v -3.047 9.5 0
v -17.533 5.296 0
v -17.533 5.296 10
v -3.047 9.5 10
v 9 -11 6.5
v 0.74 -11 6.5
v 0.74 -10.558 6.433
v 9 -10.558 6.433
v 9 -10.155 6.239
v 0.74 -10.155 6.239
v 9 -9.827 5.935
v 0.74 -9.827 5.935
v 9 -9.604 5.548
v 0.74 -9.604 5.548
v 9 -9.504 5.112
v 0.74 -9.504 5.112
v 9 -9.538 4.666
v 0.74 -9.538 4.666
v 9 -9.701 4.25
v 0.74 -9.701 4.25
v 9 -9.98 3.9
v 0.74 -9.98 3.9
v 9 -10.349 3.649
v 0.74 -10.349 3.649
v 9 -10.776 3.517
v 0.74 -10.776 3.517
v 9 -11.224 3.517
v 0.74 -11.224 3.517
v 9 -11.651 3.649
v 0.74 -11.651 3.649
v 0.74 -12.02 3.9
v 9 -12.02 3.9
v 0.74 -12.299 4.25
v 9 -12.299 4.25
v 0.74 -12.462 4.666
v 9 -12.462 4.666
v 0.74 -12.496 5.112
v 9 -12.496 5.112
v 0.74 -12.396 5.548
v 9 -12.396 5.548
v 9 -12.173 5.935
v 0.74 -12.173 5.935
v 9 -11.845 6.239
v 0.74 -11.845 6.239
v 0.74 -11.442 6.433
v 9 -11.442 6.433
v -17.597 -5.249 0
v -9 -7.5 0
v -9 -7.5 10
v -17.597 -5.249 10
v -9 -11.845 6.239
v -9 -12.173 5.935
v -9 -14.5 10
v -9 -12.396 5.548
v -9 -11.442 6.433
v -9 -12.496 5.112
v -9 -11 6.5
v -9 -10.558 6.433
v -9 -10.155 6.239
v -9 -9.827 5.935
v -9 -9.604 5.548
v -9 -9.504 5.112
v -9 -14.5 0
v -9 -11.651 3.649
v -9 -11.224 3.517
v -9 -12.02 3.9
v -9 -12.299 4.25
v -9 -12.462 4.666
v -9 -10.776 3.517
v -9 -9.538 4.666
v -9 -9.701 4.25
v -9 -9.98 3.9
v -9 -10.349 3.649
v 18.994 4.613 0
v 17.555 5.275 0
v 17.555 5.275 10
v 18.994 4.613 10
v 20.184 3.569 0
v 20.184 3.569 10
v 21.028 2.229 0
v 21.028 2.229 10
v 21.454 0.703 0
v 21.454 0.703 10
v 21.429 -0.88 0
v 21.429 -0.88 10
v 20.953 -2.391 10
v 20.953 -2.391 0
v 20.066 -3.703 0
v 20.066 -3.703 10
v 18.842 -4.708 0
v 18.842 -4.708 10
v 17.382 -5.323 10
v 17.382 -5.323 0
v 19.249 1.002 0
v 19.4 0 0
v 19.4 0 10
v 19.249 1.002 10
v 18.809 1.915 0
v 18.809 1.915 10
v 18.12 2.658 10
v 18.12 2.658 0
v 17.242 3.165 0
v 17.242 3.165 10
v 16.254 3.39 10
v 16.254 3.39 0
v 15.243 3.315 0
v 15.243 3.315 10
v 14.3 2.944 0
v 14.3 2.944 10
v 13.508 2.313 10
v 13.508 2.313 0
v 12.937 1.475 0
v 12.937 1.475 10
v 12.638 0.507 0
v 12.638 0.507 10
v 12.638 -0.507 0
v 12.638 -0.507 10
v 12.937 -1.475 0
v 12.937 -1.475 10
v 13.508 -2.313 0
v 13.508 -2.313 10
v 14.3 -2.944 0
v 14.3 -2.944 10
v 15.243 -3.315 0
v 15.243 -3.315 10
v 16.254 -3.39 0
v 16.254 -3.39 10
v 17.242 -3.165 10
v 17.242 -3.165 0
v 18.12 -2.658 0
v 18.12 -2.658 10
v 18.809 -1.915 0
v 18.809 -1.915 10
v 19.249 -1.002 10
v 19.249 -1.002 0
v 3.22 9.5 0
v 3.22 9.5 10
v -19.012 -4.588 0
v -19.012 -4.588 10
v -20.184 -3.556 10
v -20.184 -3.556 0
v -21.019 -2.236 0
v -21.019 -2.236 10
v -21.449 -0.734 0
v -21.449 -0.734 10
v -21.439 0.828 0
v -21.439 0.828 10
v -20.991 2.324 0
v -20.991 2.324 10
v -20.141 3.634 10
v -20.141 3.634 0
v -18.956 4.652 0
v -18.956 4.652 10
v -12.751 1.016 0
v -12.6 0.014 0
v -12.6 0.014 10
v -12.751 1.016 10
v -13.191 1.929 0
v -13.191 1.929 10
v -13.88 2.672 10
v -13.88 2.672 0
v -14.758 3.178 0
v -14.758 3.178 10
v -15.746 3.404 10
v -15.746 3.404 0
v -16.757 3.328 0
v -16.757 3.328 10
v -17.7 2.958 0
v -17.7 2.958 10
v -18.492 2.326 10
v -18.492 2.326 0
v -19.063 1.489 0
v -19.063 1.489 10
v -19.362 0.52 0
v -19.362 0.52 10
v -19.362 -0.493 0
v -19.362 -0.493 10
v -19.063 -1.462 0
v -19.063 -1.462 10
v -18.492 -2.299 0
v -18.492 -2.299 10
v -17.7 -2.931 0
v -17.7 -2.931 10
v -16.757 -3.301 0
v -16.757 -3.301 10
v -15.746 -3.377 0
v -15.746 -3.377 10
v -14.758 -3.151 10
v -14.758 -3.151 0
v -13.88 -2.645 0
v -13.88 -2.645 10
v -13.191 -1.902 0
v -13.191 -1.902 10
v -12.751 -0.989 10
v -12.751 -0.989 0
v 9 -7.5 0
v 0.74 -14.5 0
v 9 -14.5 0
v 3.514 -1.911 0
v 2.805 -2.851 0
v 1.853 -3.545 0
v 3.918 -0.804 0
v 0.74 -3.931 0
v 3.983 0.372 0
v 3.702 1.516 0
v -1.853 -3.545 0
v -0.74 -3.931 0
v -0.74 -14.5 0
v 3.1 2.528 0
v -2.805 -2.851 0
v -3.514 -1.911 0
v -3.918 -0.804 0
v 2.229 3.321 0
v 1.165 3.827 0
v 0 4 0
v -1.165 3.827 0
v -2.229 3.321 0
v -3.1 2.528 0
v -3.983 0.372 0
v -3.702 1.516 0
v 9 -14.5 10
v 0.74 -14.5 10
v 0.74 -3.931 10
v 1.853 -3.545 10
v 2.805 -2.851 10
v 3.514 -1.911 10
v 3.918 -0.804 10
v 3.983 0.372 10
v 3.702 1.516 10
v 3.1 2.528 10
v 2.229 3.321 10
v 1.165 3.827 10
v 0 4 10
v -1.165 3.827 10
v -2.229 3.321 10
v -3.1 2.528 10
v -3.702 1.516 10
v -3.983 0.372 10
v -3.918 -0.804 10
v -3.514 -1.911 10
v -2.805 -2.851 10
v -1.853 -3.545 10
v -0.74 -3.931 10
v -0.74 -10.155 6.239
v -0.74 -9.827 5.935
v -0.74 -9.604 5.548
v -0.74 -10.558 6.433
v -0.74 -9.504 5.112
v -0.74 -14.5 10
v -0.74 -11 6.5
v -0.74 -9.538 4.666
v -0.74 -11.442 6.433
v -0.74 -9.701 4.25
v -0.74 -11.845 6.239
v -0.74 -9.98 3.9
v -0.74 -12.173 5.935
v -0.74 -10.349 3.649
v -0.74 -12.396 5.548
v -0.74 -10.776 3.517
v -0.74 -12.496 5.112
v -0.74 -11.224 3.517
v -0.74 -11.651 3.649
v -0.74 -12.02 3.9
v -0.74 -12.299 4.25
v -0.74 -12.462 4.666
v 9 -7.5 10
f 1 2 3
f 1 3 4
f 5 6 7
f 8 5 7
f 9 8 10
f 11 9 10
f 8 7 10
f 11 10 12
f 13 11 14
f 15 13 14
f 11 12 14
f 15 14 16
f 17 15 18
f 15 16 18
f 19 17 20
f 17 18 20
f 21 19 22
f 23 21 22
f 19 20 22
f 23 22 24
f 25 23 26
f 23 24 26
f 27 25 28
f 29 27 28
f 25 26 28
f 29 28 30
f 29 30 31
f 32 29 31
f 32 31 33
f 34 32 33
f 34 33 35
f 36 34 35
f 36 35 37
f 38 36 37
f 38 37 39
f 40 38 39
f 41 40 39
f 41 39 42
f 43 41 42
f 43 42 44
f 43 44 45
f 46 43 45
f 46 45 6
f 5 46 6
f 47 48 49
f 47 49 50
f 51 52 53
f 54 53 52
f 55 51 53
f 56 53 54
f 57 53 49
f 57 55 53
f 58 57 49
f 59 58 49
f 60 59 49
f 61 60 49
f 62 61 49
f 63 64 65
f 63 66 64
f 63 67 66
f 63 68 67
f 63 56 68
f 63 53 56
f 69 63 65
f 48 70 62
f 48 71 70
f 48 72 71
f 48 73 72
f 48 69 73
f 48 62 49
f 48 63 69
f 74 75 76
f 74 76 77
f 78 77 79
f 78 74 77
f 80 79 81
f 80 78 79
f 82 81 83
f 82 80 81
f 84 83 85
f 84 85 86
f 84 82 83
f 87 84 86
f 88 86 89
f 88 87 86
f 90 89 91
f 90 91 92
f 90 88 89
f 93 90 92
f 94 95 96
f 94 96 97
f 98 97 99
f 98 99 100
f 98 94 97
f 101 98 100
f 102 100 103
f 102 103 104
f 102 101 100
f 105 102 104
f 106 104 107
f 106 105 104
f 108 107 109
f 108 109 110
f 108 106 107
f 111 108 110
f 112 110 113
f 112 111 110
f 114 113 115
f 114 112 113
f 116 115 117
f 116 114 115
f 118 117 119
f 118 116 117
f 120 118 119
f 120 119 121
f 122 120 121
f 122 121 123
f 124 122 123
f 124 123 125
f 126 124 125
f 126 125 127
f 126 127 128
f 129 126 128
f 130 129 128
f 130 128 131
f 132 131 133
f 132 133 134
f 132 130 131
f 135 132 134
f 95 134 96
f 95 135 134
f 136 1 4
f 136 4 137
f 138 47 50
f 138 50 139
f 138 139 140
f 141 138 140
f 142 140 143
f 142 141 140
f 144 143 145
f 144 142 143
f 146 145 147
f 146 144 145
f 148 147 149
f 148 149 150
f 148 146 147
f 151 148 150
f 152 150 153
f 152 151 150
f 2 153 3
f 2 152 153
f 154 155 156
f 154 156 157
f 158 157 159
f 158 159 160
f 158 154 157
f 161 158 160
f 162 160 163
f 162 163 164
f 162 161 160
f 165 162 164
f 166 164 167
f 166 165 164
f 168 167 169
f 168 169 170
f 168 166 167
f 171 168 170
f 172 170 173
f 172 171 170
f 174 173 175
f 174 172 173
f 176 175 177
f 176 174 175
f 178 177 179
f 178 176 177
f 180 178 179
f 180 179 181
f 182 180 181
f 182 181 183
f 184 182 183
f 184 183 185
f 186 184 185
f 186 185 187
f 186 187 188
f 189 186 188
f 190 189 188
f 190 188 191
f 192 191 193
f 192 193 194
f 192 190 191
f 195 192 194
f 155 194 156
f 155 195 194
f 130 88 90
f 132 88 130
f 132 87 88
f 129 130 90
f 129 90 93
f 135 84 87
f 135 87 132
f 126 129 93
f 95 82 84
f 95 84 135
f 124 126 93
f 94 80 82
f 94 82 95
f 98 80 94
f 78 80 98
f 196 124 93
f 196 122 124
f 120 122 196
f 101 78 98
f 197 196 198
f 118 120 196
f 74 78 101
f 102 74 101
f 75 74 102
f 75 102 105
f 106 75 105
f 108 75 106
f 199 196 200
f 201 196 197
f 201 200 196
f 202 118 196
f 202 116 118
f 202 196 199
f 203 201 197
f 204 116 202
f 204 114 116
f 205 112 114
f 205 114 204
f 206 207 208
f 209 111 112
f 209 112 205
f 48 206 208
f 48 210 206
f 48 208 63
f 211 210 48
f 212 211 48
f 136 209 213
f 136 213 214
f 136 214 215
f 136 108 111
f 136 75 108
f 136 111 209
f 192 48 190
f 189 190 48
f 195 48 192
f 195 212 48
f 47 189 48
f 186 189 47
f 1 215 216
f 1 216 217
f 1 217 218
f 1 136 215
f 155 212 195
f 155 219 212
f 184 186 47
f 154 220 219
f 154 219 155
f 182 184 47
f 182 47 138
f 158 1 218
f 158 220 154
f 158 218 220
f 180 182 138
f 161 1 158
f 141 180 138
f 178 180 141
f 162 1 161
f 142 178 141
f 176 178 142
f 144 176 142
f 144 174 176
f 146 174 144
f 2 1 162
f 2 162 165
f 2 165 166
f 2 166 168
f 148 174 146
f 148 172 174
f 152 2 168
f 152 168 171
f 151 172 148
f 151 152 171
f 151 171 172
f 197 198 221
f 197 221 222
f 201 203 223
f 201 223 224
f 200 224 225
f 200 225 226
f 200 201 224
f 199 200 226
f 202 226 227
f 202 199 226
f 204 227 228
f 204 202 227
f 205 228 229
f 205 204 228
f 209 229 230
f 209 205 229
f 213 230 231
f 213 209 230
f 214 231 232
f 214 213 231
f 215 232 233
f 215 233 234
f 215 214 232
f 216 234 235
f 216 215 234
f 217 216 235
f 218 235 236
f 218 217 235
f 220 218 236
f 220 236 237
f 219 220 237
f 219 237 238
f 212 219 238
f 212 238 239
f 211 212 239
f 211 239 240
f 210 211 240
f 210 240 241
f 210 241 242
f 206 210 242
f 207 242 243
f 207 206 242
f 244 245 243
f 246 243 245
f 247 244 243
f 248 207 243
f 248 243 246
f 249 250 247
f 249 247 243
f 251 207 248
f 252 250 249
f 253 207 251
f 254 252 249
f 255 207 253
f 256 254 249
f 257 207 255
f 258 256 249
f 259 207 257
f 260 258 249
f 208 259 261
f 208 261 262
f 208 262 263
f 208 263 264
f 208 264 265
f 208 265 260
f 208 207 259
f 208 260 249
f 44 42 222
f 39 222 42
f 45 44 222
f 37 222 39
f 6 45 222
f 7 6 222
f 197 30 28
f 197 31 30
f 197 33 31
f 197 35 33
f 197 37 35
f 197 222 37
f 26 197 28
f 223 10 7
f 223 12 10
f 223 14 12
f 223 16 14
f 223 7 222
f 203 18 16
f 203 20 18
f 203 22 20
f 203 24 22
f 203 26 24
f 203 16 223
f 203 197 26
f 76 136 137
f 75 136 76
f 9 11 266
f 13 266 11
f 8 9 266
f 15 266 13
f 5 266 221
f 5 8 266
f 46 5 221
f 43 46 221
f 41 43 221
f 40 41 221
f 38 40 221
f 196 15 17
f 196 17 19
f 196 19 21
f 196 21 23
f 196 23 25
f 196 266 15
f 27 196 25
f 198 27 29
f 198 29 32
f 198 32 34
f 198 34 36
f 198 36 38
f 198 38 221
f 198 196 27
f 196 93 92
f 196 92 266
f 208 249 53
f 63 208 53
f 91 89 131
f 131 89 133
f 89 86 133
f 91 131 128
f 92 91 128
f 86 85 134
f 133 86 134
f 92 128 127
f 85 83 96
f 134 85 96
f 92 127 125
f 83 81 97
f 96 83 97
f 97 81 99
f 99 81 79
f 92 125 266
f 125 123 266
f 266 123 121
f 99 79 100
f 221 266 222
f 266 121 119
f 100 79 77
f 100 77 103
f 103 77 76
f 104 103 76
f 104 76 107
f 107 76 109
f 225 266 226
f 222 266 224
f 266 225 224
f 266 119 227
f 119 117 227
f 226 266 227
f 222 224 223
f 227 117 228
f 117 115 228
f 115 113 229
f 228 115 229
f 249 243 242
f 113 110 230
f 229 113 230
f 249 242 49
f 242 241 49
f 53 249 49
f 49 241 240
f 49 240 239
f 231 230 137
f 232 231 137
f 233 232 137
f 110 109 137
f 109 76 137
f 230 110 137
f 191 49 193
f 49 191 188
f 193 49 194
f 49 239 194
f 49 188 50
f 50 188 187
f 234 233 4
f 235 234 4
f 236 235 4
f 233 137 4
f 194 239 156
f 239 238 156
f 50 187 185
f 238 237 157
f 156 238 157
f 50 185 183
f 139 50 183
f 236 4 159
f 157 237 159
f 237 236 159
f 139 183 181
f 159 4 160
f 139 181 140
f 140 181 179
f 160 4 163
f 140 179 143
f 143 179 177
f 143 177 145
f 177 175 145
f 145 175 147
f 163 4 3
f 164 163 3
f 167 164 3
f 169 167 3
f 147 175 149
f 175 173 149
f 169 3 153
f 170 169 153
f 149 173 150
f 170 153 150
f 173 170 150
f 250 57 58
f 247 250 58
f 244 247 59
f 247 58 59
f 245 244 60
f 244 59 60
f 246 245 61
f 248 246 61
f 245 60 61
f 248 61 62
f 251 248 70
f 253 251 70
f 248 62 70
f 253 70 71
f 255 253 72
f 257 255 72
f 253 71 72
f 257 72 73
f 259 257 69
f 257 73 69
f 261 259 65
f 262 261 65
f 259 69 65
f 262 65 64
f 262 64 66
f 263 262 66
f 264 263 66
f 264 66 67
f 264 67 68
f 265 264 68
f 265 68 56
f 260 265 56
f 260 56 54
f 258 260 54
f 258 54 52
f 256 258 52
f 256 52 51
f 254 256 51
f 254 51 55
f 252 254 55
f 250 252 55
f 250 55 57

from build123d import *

# Parameters (mm, degrees)
SKETCH2_R           = 3.4
BOSS_EXTRUDE2_DEPTH = 10
SKETCH3_R           = 1.5
CUT_EXTRUDE1_DEPTH  = 30


with BuildPart() as part:
    # Sketch2 → Boss-Extrude2 (new body)
    with BuildSketch(Plane.XY):
        with BuildLine():
            Line((-3.046772292, 9.5), (3.21957788, 9.5))
            Line((3.21957788, 9.5), (17.554684003, 5.275299758))
            ThreePointArc((17.554684003, 5.275299758), (21.498894584, -0.089376976), (17.382422577, -5.32303839))
            Line((17.382422577, -5.32303839), (9, -7.5))
            Line((9, -7.5), (9, -14.5))
            Line((9, -14.5), (0.740403033, -14.5))
            Line((0.740403033, -14.5), (0.740403033, -3.930878191))
            ThreePointArc((0.740403033, -3.930878191), (0, 4), (-0.740403033, -3.930878191))
            Line((-0.740403033, -3.930878191), (-0.740403033, -14.5))
            Line((-0.740403033, -14.5), (-9, -14.5))
            Line((-9, -14.5), (-9, -7.5))
            Line((-9, -7.5), (-17.597446952, -5.249385871))
            ThreePointArc((-17.597446952, -5.249385871), (-21.499891691, 0.047111305), (-17.533036453, 5.295541242))
            Line((-17.533036453, 5.295541242), (-3.046772292, 9.5))
        make_face()
        with Locations((-15.99999429, 0.013516845)):
            Circle(SKETCH2_R, mode=Mode.SUBTRACT)
        with Locations((16, 0)):
            Circle(SKETCH2_R, mode=Mode.SUBTRACT)
    extrude(amount=BOSS_EXTRUDE2_DEPTH)

    # Sketch3 → Cut-Extrude1 (cut)
    with BuildSketch(Plane.ZY.offset(9)):
        with Locations((5, -11)):
            Circle(SKETCH3_R)
    extrude(amount=-CUT_EXTRUDE1_DEPTH, mode=Mode.SUBTRACT)


solid = part.part
